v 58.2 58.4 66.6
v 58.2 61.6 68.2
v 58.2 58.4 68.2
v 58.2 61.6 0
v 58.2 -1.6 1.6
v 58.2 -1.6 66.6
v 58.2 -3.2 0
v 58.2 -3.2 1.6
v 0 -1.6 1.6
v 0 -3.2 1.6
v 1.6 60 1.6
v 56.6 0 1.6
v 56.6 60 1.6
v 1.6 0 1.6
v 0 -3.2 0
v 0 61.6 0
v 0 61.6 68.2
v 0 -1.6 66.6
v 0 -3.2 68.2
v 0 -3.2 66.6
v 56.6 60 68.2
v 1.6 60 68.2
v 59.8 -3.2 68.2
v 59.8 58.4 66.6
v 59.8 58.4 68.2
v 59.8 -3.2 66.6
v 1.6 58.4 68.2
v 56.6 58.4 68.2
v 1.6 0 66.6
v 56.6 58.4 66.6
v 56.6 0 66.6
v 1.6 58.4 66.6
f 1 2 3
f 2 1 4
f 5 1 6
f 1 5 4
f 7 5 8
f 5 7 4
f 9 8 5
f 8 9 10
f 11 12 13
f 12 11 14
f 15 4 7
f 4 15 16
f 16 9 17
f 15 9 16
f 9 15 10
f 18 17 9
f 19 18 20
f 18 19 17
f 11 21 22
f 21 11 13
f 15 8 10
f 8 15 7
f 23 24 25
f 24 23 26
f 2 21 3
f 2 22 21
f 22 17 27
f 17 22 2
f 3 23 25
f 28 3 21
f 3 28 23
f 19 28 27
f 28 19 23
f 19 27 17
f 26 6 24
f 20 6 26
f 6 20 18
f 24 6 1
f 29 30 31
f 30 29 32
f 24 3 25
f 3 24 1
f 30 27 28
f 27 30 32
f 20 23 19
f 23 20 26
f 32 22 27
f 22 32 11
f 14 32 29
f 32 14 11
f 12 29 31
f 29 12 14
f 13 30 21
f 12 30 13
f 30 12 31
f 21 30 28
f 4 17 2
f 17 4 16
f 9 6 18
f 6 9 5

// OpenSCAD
module gabinete(pbcLargura, pedAltura, pfd, esp){
    
    //pBaixo
    translate([0,-esp*2,0]) cube([esp+pbcLargura+esp, pfd+esp*2, esp]);
    
    //pCima
    translate([0,-esp*2,pedAltura+esp]) cube([esp+pbcLargura+esp*2, pfd+esp, esp]);

    //pEsquerda
    translate([0,0,0]) cube([esp, pfd, esp+pedAltura+esp]);
    
    //pDireita
    translate([pbcLargura+esp,0,0]) cube([esp, pfd, esp+pedAltura+esp]);
    
    //pFundo
    translate([0,pfd,0]) cube([esp+pbcLargura+esp, esp, esp+pedAltura+esp]);
    
    //pPorta
    translate([0,-esp,esp]) rotate($t*-90,0,0) cube([esp+pbcLargura+esp, esp, pedAltura]);
    
}

//espessura das placas
esp = 1.6;

gabinete (55, 65, 60, esp);
